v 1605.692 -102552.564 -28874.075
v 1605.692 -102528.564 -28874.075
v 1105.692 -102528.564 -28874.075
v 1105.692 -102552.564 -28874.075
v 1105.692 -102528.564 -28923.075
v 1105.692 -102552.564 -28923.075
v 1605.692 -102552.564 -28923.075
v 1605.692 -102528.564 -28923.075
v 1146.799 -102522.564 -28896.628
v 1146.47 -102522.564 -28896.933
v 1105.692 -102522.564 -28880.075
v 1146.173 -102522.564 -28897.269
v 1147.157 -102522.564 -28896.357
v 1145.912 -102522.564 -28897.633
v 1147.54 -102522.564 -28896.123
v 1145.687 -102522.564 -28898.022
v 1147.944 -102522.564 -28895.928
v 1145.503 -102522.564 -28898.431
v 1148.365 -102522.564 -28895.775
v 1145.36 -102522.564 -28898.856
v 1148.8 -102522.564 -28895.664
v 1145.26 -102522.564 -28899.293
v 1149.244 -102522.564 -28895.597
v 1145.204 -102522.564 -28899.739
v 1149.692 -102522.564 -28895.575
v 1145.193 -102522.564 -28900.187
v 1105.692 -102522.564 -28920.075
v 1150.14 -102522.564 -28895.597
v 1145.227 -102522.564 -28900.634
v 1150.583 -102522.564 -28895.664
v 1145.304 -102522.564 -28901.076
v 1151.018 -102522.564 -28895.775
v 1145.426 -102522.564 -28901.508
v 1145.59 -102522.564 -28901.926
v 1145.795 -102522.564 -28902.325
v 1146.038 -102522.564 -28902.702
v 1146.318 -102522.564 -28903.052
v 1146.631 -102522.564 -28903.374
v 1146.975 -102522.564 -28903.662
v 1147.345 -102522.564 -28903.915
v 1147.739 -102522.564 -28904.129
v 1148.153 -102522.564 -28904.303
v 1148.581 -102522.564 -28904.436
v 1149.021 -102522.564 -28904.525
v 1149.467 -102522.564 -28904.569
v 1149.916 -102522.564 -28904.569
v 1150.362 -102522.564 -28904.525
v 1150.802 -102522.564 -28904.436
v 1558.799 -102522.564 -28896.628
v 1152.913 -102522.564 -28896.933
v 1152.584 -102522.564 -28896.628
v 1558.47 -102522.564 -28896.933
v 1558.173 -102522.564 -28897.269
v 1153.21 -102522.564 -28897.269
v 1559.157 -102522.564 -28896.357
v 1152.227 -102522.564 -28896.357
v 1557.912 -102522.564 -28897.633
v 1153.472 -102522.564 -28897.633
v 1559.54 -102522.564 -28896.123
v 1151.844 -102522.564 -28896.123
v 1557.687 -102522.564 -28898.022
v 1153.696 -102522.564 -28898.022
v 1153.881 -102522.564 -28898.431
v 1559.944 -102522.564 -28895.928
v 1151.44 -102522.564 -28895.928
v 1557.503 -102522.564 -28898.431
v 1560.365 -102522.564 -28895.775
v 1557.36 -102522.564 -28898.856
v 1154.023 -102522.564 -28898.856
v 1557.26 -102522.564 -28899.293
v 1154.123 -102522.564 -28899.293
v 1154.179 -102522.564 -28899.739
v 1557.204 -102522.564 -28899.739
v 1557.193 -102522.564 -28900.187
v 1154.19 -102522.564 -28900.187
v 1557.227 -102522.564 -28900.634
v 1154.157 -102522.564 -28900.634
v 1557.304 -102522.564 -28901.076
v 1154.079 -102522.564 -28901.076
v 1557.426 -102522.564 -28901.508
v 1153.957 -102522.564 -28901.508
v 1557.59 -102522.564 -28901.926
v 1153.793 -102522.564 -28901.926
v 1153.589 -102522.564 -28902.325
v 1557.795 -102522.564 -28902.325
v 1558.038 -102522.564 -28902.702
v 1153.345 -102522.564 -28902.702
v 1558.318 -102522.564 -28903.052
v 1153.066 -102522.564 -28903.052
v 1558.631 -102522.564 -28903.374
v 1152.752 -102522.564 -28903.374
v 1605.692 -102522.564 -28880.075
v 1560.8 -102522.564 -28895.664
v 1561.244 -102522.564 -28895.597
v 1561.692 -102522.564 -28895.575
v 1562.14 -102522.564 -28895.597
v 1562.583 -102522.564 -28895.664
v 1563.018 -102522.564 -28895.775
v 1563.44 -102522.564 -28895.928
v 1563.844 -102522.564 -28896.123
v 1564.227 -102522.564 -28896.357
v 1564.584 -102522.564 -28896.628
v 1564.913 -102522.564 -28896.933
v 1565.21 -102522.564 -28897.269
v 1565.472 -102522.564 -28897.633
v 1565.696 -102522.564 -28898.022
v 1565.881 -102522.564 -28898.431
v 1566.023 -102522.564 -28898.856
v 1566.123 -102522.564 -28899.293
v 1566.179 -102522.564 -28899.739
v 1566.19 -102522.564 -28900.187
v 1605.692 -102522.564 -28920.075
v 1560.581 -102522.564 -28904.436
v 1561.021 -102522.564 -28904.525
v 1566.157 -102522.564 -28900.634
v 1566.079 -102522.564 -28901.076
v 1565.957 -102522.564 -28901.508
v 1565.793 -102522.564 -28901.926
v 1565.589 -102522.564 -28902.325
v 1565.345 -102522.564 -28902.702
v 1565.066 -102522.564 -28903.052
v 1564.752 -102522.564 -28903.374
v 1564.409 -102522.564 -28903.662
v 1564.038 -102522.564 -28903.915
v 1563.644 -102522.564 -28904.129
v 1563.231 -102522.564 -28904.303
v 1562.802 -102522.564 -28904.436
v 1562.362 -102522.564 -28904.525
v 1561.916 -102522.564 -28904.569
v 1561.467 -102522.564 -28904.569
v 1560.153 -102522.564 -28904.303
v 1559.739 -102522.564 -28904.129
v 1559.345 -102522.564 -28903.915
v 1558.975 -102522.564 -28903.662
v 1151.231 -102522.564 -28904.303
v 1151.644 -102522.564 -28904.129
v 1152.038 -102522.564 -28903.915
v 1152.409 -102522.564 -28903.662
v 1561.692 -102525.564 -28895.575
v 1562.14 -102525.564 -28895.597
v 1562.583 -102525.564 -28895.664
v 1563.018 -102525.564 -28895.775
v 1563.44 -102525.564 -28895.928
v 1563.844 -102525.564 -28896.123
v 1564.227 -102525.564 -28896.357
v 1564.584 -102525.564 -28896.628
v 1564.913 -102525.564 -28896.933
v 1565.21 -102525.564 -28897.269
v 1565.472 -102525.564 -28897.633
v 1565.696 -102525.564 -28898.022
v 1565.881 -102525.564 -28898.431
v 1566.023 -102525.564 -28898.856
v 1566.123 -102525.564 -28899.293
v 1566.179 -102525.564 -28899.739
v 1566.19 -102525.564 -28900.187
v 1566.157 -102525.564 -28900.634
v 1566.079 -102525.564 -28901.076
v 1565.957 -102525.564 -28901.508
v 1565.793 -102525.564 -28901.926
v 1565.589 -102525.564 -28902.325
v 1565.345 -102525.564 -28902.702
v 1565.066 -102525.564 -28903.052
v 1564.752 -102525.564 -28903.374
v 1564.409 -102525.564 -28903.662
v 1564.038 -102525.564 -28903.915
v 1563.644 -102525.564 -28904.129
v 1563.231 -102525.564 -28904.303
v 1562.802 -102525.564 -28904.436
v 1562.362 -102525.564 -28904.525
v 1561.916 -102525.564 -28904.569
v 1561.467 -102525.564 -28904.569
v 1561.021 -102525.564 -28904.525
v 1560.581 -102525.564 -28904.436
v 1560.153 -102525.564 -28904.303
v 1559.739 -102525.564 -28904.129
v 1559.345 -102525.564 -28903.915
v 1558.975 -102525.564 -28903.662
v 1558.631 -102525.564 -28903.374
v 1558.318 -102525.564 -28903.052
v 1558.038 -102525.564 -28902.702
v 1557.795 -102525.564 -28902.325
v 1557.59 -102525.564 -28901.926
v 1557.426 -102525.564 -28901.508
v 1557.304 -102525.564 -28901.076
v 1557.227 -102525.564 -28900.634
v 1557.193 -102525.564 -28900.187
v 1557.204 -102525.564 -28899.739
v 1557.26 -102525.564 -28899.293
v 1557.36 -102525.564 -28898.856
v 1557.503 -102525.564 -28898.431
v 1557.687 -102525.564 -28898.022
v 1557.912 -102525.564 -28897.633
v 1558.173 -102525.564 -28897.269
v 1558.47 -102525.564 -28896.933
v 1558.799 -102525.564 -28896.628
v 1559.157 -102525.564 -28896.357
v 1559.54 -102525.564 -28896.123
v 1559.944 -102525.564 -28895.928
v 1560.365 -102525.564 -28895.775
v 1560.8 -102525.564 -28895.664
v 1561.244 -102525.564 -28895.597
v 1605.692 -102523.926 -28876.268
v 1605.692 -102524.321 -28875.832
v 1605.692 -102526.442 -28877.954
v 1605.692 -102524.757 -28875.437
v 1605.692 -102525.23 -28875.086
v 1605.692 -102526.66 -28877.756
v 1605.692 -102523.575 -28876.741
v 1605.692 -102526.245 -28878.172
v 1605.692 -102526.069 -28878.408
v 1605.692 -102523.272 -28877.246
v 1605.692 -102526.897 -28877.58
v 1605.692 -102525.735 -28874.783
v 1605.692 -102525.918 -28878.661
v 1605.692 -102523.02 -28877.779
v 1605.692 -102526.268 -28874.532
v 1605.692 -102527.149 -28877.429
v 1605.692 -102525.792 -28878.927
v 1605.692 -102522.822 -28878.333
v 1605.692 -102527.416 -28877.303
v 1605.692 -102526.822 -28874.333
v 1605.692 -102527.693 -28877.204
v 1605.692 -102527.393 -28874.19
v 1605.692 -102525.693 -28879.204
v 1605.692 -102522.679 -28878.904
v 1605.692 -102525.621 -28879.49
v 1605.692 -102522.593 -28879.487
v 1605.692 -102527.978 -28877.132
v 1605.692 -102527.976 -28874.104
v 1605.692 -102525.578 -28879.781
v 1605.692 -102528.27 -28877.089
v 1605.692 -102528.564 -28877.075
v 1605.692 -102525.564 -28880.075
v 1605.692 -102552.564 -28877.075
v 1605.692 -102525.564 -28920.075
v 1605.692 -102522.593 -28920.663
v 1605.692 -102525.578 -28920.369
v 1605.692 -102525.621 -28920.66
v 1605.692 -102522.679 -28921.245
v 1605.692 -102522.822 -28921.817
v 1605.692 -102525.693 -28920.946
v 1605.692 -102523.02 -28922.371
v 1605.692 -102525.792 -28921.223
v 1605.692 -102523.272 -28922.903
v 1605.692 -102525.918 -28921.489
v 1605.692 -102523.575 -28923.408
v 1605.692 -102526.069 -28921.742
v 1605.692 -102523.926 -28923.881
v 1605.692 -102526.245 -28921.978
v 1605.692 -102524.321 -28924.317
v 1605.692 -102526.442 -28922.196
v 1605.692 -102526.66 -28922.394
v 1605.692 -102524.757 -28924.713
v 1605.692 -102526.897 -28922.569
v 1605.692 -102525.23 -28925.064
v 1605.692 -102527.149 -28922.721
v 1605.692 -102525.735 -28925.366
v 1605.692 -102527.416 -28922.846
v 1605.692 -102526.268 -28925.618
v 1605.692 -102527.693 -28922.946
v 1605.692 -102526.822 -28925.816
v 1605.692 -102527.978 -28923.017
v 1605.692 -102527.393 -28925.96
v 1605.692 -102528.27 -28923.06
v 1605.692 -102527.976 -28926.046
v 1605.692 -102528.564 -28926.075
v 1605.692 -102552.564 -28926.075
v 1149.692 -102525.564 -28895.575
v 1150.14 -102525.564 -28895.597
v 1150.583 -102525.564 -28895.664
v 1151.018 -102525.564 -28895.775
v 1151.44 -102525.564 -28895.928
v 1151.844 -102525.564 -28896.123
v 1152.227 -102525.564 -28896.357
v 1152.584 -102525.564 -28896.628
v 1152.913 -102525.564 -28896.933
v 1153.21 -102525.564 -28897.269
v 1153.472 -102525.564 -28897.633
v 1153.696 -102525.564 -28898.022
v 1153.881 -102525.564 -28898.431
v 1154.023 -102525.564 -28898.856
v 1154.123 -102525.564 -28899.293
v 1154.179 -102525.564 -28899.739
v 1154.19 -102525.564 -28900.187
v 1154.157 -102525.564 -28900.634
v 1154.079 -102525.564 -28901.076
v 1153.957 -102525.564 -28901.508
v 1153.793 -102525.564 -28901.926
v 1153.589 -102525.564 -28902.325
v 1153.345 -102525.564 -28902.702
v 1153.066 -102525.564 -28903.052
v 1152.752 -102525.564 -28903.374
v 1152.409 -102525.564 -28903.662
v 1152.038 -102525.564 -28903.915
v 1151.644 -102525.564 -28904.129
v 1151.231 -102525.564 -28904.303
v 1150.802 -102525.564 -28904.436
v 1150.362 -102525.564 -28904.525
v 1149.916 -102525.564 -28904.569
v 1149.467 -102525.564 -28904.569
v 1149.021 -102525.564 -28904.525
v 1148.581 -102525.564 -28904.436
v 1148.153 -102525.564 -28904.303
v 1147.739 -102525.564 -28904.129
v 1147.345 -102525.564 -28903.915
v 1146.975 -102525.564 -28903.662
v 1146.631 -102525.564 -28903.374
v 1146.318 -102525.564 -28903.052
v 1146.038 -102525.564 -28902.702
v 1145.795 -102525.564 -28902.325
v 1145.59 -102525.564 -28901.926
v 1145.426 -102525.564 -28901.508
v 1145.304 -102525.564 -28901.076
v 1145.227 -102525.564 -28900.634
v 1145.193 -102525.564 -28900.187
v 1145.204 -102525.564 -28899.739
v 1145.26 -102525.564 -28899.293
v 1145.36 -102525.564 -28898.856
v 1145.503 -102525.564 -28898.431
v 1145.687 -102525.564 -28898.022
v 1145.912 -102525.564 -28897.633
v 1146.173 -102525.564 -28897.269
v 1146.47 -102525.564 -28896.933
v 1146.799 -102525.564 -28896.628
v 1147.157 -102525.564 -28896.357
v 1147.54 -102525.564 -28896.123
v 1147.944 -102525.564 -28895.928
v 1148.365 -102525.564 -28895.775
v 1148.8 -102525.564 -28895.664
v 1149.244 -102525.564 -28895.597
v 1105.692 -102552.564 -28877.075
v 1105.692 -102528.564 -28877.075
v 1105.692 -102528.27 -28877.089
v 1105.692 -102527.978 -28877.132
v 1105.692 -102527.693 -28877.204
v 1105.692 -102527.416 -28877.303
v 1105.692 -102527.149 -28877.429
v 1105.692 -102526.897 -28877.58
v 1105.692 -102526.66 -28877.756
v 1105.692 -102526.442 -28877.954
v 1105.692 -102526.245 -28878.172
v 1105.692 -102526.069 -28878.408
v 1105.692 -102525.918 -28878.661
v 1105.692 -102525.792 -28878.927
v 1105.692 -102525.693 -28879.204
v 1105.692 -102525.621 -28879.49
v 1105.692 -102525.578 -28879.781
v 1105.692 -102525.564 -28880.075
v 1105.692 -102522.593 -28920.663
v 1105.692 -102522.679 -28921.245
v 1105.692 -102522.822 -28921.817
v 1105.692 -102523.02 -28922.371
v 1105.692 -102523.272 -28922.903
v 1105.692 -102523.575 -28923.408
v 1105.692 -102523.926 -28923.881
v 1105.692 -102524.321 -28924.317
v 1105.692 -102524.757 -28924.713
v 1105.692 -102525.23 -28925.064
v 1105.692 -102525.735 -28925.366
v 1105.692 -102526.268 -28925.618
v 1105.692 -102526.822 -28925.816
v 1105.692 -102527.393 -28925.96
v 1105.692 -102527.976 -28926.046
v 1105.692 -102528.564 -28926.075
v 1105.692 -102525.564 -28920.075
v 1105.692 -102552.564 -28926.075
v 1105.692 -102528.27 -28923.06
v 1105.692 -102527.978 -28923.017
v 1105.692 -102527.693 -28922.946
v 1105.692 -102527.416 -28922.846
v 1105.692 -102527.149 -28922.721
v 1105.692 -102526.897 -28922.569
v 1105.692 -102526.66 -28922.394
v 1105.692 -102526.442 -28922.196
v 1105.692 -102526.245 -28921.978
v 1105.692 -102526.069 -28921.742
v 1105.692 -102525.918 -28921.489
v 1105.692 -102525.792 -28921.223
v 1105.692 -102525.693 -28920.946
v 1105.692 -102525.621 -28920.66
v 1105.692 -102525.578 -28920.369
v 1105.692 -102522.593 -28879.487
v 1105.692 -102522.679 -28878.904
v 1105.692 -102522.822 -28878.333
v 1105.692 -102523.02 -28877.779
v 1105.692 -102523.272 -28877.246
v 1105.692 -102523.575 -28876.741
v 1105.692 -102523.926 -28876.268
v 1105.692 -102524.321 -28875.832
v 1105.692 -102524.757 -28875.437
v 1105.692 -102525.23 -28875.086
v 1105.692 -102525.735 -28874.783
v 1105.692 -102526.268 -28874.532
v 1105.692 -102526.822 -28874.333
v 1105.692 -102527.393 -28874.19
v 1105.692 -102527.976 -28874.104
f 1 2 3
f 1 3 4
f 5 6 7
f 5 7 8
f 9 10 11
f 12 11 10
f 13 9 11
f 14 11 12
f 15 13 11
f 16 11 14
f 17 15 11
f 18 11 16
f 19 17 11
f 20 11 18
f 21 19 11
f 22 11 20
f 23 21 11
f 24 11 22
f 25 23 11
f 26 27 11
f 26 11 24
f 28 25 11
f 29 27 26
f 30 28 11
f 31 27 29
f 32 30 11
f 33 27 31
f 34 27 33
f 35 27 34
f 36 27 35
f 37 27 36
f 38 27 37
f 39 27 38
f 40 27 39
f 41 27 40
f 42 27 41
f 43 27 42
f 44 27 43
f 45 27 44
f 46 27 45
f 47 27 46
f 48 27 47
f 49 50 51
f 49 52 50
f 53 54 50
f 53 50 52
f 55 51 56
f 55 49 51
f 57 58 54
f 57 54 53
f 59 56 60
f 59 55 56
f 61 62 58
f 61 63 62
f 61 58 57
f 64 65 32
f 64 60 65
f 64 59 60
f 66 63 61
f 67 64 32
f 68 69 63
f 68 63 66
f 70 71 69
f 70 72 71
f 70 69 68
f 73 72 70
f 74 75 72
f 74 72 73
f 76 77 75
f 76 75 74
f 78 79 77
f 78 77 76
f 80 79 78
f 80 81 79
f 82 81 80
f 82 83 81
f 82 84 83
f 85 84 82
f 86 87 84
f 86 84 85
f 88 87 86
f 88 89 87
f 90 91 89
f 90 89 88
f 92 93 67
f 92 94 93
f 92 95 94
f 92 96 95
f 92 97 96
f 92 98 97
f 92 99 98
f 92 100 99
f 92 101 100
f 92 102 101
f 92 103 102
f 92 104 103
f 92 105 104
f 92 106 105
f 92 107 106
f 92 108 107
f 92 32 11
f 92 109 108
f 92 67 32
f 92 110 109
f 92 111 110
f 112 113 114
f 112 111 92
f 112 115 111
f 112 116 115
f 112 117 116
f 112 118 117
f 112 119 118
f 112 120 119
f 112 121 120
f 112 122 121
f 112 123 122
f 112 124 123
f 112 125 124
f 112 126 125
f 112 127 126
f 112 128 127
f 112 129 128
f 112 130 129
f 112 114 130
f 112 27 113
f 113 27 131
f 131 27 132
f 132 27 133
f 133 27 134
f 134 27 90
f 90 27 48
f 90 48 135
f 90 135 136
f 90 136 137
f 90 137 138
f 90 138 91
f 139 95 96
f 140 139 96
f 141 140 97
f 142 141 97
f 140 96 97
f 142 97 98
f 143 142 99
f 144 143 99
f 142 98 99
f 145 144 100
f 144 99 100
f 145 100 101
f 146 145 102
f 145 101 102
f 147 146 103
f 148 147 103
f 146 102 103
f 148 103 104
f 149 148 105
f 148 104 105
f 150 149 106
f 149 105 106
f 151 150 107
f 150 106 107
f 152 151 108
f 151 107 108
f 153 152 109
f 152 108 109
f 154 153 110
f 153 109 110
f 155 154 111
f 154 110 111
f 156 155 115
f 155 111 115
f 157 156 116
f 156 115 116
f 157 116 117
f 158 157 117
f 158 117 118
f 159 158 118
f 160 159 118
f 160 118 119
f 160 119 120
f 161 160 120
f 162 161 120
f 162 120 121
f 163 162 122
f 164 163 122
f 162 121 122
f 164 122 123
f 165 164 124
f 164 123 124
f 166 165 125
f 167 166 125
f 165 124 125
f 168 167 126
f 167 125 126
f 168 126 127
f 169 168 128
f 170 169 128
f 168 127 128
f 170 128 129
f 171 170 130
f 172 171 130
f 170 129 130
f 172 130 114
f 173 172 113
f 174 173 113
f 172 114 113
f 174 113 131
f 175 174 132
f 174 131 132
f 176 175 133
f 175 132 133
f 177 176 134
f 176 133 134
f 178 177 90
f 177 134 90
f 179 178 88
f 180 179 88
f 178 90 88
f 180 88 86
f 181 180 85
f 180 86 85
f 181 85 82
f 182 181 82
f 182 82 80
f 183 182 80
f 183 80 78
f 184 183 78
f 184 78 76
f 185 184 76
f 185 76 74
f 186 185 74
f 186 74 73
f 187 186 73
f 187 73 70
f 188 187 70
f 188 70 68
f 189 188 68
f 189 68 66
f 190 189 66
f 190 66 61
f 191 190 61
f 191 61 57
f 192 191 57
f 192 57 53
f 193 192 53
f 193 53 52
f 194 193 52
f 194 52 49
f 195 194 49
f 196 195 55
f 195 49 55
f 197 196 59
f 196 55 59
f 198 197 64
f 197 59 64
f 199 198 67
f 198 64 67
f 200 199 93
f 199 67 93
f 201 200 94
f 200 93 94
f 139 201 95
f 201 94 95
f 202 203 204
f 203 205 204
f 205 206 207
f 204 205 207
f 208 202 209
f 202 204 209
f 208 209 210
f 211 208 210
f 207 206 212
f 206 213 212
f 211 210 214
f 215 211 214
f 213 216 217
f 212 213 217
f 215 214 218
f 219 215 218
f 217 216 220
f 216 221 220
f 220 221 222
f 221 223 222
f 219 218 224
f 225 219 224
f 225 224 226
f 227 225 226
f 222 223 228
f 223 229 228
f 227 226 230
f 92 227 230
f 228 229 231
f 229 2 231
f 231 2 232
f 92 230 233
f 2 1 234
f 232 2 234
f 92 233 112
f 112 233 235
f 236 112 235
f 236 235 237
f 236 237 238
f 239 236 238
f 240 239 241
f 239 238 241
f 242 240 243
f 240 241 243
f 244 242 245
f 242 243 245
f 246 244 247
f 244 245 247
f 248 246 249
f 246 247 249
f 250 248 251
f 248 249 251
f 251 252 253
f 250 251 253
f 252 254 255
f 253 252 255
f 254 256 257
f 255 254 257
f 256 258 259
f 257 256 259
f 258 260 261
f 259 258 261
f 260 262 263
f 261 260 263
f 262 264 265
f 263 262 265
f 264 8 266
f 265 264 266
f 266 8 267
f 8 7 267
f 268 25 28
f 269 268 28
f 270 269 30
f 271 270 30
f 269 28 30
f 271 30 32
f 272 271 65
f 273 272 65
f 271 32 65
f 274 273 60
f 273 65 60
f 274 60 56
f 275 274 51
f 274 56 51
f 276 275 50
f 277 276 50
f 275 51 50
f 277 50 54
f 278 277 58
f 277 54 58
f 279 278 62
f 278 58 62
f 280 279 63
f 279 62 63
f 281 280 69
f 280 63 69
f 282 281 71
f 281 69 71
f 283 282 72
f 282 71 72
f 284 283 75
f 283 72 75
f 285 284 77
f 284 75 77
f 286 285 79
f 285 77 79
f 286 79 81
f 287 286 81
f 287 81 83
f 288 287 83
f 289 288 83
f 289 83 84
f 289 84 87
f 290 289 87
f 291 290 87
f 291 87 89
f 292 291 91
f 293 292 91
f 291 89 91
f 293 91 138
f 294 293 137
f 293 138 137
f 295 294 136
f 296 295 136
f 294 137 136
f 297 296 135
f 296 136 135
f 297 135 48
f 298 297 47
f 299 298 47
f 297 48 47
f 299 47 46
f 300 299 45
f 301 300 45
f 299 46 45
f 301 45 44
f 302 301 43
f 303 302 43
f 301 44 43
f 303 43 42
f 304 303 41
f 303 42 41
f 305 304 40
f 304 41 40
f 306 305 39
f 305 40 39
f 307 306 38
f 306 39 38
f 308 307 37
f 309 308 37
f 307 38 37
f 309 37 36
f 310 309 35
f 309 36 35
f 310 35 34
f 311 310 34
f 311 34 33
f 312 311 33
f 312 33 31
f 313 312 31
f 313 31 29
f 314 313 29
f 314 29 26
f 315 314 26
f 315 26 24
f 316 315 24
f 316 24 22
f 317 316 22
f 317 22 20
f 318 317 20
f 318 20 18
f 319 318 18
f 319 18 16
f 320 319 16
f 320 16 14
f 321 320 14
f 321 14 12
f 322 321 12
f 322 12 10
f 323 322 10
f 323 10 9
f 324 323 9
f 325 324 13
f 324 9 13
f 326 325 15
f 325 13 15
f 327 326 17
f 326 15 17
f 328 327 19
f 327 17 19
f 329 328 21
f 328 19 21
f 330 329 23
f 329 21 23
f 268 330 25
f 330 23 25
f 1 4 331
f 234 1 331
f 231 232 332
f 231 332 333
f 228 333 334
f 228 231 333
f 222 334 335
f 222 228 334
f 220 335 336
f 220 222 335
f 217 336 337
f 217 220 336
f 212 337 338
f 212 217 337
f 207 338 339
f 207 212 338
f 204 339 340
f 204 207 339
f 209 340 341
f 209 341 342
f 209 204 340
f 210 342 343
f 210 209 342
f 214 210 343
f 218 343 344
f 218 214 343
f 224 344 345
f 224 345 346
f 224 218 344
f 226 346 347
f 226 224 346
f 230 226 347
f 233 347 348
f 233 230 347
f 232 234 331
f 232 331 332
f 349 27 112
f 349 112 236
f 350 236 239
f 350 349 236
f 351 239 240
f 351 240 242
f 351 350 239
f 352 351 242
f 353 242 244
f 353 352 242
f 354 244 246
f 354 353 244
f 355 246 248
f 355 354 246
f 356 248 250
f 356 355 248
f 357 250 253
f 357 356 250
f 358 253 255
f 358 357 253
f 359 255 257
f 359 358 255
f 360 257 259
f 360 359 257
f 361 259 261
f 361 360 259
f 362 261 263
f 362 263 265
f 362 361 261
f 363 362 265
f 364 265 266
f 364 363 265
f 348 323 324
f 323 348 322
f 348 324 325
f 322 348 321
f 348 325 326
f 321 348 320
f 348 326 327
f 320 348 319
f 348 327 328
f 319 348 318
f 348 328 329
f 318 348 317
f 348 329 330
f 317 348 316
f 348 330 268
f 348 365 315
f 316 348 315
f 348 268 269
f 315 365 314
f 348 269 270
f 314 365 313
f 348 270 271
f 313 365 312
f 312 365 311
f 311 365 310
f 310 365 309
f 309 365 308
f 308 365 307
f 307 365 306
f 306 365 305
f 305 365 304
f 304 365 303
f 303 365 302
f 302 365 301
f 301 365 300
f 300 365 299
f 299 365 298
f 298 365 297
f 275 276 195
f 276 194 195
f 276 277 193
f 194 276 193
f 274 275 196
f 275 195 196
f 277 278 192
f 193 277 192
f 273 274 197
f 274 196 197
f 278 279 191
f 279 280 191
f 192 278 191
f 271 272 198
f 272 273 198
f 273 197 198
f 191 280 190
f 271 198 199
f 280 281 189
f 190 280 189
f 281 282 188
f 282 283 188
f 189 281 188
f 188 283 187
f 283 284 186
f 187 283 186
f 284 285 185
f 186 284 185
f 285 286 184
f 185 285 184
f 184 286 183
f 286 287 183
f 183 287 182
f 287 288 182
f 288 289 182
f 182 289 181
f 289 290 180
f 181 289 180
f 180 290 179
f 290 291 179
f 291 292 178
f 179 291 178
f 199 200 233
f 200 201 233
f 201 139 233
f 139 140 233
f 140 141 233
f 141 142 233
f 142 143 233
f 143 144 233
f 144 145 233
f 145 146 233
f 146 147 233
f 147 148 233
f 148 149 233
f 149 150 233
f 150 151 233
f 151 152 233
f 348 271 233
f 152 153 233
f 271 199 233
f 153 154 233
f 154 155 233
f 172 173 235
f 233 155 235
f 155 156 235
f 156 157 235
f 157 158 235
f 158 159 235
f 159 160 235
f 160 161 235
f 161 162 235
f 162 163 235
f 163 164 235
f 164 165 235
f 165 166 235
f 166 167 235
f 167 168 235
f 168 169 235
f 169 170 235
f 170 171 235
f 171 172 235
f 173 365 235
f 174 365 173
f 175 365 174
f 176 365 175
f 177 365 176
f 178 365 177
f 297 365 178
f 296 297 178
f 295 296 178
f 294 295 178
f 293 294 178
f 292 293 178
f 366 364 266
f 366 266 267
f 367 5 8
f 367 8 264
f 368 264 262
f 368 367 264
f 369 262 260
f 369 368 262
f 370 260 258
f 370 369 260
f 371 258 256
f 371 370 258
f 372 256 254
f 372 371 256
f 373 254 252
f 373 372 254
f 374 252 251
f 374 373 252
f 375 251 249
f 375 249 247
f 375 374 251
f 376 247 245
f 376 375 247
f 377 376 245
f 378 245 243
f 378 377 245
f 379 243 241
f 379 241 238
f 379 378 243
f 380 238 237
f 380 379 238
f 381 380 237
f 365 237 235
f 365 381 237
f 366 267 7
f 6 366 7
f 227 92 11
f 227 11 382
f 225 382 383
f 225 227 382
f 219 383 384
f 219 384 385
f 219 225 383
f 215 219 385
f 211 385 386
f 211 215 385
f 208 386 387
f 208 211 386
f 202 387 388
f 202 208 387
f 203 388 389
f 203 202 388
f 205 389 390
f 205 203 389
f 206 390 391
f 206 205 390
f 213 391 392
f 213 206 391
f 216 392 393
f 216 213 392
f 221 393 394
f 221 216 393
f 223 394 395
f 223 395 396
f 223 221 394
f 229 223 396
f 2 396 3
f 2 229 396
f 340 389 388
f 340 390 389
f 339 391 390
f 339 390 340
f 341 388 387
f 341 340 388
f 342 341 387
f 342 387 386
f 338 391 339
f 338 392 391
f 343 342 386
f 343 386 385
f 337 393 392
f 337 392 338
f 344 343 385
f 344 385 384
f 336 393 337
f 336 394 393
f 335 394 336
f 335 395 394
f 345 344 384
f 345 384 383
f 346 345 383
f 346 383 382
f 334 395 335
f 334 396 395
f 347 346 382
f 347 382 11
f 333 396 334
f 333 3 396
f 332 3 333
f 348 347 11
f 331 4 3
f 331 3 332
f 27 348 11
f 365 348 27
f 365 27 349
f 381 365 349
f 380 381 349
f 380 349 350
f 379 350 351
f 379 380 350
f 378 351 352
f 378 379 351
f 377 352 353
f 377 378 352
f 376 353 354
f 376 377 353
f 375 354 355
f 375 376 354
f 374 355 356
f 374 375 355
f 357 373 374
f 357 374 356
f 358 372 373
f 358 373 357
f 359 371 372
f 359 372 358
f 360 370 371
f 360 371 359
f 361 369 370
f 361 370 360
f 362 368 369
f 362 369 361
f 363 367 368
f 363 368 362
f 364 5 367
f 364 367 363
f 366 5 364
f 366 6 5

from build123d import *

# Parameters (mm, degrees)
SKETCH1_W               = 500
SKETCH1_H               = 40
SKETCH1_R               = 4.5
BASE_FLANGE1_DEPTH      = 3
EDGE_FLANGE1_DEPTH      = 500
EDGE_FLANGE1_BEND_DEPTH = 500


# Sheet-metal steps are written as plain solids
with BuildPart() as part:
    # Sketch1 → Base-Flange1 (new body)
    with BuildSketch(Plane(origin=(1355.32335997, -102522.563627841, -30605.108385113), x_dir=(1, 0, 0), z_dir=(0, 1, 0))):
        with Locations((0.368301387, -1705.033559341)):
            Rectangle(SKETCH1_W, SKETCH1_H)
        with Locations(Location((-205.631698613, -1705.033559341, 0), (0, 0, 270))):
            Circle(SKETCH1_R, mode=Mode.SUBTRACT)
        with Locations(Location((206.368301387, -1705.033559341, 0), (0, 0, 270))):
            Circle(SKETCH1_R, mode=Mode.SUBTRACT)
    extrude(amount=-BASE_FLANGE1_DEPTH)

    # Edge-Flange1 section (across the edge) → Edge-Flange1 (add)
    with BuildSketch(Plane(origin=(1605.691661356, -102525.563627841, -28877.074825771), x_dir=(0, 0, -1), z_dir=(-1, 0, 0))):
        with BuildLine():
            Line((-3, 3), (-3, 27))
            Line((-3, 27), (0, 27))
            Line((0, 27), (0, 3))
            ThreePointArc((0, 3), (0.878679656, 0.878679656), (3, 0))
            Line((3, 0), (3, -3))
            ThreePointArc((3, -3), (-1.242640687, -1.242640687), (-3, 3))
        make_face()
    extrude(amount=EDGE_FLANGE1_DEPTH)

    # Edge-Flange1 section 2 (across the edge) → Edge-Flange1 bend (add)
    with BuildSketch(Plane(origin=(1105.691661356, -102525.563627841, -28923.074825771), x_dir=(0, 0, 1), z_dir=(1, 0, 0))):
        with BuildLine():
            Line((-3, 3), (-3, 27))
            Line((-3, 27), (0, 27))
            Line((0, 27), (0, 3))
            ThreePointArc((0, 3), (0.878679656, 0.878679656), (3, 0))
            Line((3, 0), (3, -3))
            ThreePointArc((3, -3), (-1.242640687, -1.242640687), (-3, 3))
        make_face()
    extrude(amount=EDGE_FLANGE1_BEND_DEPTH)


solid = part.part
